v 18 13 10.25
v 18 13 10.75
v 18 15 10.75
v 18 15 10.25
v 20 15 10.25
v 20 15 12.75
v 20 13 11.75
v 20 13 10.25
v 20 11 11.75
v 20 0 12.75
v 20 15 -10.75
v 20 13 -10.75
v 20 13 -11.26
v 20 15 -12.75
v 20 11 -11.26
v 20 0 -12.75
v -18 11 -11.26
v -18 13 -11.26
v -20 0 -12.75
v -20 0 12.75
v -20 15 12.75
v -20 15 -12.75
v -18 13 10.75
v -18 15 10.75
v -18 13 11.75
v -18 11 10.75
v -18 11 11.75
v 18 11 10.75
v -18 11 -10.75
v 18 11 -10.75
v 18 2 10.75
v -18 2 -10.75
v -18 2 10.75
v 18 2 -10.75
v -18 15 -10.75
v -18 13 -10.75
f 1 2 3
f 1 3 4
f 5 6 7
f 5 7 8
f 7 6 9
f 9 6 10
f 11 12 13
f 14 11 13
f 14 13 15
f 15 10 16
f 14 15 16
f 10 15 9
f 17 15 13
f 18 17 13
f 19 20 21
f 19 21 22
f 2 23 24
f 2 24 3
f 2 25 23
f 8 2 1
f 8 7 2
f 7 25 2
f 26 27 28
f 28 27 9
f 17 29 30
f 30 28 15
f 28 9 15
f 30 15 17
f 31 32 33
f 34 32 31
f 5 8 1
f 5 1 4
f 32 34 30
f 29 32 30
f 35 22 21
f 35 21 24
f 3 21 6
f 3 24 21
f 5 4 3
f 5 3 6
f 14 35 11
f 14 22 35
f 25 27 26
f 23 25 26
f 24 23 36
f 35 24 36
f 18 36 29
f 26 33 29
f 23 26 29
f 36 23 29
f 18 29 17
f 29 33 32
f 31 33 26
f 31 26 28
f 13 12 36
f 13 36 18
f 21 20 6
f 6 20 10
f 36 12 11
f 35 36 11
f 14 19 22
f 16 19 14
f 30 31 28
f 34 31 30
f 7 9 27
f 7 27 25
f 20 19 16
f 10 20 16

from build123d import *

# Parameters (mm, degrees)
SKETCH1_W           = 40
SKETCH1_H           = 25.5
BOSS_EXTRUDE1_DEPTH = 15
SHELL1_T            = -2
SKETCH2_W           = 21
SKETCH2_H           = 4
CUT_EXTRUDE1_DEPTH  = 2
SKETCH3_W           = 23.01
SKETCH3_H           = 2
CUT_EXTRUDE2_DEPTH  = 38


with BuildPart() as part:
    # Sketch1 → Boss-Extrude1 (new body)
    with BuildSketch(Plane(origin=(0, 0, 0), x_dir=(1, 0, 0), z_dir=(0, 1, 0))):
        Rectangle(SKETCH1_W, SKETCH1_H)
    extrude(amount=BOSS_EXTRUDE1_DEPTH)

    # Shell1
    shell1_openings = [part.faces().sort_by_distance(p)[0] for p in [
        (0, 15, 0),
    ]]
    offset(amount=SHELL1_T, openings=shell1_openings, kind=Kind.INTERSECTION)

    # Sketch2 → Cut-Extrude1 (cut)
    with BuildSketch(Plane(origin=(20, 0, 0), x_dir=(0, 0, -1), z_dir=(1, 0, 0))):
        with Locations((0.25, 13)):
            Rectangle(SKETCH2_W, SKETCH2_H)
    extrude(amount=-CUT_EXTRUDE1_DEPTH, mode=Mode.SUBTRACT)

    # Sketch3 → Cut-Extrude2 (cut)
    with BuildSketch(Plane(origin=(20, 0, 0), x_dir=(0, 0, -1), z_dir=(1, 0, 0))):
        with Locations((-0.245, 12)):
            Rectangle(SKETCH3_W, SKETCH3_H)
    extrude(amount=-CUT_EXTRUDE2_DEPTH, mode=Mode.SUBTRACT)


solid = part.part
